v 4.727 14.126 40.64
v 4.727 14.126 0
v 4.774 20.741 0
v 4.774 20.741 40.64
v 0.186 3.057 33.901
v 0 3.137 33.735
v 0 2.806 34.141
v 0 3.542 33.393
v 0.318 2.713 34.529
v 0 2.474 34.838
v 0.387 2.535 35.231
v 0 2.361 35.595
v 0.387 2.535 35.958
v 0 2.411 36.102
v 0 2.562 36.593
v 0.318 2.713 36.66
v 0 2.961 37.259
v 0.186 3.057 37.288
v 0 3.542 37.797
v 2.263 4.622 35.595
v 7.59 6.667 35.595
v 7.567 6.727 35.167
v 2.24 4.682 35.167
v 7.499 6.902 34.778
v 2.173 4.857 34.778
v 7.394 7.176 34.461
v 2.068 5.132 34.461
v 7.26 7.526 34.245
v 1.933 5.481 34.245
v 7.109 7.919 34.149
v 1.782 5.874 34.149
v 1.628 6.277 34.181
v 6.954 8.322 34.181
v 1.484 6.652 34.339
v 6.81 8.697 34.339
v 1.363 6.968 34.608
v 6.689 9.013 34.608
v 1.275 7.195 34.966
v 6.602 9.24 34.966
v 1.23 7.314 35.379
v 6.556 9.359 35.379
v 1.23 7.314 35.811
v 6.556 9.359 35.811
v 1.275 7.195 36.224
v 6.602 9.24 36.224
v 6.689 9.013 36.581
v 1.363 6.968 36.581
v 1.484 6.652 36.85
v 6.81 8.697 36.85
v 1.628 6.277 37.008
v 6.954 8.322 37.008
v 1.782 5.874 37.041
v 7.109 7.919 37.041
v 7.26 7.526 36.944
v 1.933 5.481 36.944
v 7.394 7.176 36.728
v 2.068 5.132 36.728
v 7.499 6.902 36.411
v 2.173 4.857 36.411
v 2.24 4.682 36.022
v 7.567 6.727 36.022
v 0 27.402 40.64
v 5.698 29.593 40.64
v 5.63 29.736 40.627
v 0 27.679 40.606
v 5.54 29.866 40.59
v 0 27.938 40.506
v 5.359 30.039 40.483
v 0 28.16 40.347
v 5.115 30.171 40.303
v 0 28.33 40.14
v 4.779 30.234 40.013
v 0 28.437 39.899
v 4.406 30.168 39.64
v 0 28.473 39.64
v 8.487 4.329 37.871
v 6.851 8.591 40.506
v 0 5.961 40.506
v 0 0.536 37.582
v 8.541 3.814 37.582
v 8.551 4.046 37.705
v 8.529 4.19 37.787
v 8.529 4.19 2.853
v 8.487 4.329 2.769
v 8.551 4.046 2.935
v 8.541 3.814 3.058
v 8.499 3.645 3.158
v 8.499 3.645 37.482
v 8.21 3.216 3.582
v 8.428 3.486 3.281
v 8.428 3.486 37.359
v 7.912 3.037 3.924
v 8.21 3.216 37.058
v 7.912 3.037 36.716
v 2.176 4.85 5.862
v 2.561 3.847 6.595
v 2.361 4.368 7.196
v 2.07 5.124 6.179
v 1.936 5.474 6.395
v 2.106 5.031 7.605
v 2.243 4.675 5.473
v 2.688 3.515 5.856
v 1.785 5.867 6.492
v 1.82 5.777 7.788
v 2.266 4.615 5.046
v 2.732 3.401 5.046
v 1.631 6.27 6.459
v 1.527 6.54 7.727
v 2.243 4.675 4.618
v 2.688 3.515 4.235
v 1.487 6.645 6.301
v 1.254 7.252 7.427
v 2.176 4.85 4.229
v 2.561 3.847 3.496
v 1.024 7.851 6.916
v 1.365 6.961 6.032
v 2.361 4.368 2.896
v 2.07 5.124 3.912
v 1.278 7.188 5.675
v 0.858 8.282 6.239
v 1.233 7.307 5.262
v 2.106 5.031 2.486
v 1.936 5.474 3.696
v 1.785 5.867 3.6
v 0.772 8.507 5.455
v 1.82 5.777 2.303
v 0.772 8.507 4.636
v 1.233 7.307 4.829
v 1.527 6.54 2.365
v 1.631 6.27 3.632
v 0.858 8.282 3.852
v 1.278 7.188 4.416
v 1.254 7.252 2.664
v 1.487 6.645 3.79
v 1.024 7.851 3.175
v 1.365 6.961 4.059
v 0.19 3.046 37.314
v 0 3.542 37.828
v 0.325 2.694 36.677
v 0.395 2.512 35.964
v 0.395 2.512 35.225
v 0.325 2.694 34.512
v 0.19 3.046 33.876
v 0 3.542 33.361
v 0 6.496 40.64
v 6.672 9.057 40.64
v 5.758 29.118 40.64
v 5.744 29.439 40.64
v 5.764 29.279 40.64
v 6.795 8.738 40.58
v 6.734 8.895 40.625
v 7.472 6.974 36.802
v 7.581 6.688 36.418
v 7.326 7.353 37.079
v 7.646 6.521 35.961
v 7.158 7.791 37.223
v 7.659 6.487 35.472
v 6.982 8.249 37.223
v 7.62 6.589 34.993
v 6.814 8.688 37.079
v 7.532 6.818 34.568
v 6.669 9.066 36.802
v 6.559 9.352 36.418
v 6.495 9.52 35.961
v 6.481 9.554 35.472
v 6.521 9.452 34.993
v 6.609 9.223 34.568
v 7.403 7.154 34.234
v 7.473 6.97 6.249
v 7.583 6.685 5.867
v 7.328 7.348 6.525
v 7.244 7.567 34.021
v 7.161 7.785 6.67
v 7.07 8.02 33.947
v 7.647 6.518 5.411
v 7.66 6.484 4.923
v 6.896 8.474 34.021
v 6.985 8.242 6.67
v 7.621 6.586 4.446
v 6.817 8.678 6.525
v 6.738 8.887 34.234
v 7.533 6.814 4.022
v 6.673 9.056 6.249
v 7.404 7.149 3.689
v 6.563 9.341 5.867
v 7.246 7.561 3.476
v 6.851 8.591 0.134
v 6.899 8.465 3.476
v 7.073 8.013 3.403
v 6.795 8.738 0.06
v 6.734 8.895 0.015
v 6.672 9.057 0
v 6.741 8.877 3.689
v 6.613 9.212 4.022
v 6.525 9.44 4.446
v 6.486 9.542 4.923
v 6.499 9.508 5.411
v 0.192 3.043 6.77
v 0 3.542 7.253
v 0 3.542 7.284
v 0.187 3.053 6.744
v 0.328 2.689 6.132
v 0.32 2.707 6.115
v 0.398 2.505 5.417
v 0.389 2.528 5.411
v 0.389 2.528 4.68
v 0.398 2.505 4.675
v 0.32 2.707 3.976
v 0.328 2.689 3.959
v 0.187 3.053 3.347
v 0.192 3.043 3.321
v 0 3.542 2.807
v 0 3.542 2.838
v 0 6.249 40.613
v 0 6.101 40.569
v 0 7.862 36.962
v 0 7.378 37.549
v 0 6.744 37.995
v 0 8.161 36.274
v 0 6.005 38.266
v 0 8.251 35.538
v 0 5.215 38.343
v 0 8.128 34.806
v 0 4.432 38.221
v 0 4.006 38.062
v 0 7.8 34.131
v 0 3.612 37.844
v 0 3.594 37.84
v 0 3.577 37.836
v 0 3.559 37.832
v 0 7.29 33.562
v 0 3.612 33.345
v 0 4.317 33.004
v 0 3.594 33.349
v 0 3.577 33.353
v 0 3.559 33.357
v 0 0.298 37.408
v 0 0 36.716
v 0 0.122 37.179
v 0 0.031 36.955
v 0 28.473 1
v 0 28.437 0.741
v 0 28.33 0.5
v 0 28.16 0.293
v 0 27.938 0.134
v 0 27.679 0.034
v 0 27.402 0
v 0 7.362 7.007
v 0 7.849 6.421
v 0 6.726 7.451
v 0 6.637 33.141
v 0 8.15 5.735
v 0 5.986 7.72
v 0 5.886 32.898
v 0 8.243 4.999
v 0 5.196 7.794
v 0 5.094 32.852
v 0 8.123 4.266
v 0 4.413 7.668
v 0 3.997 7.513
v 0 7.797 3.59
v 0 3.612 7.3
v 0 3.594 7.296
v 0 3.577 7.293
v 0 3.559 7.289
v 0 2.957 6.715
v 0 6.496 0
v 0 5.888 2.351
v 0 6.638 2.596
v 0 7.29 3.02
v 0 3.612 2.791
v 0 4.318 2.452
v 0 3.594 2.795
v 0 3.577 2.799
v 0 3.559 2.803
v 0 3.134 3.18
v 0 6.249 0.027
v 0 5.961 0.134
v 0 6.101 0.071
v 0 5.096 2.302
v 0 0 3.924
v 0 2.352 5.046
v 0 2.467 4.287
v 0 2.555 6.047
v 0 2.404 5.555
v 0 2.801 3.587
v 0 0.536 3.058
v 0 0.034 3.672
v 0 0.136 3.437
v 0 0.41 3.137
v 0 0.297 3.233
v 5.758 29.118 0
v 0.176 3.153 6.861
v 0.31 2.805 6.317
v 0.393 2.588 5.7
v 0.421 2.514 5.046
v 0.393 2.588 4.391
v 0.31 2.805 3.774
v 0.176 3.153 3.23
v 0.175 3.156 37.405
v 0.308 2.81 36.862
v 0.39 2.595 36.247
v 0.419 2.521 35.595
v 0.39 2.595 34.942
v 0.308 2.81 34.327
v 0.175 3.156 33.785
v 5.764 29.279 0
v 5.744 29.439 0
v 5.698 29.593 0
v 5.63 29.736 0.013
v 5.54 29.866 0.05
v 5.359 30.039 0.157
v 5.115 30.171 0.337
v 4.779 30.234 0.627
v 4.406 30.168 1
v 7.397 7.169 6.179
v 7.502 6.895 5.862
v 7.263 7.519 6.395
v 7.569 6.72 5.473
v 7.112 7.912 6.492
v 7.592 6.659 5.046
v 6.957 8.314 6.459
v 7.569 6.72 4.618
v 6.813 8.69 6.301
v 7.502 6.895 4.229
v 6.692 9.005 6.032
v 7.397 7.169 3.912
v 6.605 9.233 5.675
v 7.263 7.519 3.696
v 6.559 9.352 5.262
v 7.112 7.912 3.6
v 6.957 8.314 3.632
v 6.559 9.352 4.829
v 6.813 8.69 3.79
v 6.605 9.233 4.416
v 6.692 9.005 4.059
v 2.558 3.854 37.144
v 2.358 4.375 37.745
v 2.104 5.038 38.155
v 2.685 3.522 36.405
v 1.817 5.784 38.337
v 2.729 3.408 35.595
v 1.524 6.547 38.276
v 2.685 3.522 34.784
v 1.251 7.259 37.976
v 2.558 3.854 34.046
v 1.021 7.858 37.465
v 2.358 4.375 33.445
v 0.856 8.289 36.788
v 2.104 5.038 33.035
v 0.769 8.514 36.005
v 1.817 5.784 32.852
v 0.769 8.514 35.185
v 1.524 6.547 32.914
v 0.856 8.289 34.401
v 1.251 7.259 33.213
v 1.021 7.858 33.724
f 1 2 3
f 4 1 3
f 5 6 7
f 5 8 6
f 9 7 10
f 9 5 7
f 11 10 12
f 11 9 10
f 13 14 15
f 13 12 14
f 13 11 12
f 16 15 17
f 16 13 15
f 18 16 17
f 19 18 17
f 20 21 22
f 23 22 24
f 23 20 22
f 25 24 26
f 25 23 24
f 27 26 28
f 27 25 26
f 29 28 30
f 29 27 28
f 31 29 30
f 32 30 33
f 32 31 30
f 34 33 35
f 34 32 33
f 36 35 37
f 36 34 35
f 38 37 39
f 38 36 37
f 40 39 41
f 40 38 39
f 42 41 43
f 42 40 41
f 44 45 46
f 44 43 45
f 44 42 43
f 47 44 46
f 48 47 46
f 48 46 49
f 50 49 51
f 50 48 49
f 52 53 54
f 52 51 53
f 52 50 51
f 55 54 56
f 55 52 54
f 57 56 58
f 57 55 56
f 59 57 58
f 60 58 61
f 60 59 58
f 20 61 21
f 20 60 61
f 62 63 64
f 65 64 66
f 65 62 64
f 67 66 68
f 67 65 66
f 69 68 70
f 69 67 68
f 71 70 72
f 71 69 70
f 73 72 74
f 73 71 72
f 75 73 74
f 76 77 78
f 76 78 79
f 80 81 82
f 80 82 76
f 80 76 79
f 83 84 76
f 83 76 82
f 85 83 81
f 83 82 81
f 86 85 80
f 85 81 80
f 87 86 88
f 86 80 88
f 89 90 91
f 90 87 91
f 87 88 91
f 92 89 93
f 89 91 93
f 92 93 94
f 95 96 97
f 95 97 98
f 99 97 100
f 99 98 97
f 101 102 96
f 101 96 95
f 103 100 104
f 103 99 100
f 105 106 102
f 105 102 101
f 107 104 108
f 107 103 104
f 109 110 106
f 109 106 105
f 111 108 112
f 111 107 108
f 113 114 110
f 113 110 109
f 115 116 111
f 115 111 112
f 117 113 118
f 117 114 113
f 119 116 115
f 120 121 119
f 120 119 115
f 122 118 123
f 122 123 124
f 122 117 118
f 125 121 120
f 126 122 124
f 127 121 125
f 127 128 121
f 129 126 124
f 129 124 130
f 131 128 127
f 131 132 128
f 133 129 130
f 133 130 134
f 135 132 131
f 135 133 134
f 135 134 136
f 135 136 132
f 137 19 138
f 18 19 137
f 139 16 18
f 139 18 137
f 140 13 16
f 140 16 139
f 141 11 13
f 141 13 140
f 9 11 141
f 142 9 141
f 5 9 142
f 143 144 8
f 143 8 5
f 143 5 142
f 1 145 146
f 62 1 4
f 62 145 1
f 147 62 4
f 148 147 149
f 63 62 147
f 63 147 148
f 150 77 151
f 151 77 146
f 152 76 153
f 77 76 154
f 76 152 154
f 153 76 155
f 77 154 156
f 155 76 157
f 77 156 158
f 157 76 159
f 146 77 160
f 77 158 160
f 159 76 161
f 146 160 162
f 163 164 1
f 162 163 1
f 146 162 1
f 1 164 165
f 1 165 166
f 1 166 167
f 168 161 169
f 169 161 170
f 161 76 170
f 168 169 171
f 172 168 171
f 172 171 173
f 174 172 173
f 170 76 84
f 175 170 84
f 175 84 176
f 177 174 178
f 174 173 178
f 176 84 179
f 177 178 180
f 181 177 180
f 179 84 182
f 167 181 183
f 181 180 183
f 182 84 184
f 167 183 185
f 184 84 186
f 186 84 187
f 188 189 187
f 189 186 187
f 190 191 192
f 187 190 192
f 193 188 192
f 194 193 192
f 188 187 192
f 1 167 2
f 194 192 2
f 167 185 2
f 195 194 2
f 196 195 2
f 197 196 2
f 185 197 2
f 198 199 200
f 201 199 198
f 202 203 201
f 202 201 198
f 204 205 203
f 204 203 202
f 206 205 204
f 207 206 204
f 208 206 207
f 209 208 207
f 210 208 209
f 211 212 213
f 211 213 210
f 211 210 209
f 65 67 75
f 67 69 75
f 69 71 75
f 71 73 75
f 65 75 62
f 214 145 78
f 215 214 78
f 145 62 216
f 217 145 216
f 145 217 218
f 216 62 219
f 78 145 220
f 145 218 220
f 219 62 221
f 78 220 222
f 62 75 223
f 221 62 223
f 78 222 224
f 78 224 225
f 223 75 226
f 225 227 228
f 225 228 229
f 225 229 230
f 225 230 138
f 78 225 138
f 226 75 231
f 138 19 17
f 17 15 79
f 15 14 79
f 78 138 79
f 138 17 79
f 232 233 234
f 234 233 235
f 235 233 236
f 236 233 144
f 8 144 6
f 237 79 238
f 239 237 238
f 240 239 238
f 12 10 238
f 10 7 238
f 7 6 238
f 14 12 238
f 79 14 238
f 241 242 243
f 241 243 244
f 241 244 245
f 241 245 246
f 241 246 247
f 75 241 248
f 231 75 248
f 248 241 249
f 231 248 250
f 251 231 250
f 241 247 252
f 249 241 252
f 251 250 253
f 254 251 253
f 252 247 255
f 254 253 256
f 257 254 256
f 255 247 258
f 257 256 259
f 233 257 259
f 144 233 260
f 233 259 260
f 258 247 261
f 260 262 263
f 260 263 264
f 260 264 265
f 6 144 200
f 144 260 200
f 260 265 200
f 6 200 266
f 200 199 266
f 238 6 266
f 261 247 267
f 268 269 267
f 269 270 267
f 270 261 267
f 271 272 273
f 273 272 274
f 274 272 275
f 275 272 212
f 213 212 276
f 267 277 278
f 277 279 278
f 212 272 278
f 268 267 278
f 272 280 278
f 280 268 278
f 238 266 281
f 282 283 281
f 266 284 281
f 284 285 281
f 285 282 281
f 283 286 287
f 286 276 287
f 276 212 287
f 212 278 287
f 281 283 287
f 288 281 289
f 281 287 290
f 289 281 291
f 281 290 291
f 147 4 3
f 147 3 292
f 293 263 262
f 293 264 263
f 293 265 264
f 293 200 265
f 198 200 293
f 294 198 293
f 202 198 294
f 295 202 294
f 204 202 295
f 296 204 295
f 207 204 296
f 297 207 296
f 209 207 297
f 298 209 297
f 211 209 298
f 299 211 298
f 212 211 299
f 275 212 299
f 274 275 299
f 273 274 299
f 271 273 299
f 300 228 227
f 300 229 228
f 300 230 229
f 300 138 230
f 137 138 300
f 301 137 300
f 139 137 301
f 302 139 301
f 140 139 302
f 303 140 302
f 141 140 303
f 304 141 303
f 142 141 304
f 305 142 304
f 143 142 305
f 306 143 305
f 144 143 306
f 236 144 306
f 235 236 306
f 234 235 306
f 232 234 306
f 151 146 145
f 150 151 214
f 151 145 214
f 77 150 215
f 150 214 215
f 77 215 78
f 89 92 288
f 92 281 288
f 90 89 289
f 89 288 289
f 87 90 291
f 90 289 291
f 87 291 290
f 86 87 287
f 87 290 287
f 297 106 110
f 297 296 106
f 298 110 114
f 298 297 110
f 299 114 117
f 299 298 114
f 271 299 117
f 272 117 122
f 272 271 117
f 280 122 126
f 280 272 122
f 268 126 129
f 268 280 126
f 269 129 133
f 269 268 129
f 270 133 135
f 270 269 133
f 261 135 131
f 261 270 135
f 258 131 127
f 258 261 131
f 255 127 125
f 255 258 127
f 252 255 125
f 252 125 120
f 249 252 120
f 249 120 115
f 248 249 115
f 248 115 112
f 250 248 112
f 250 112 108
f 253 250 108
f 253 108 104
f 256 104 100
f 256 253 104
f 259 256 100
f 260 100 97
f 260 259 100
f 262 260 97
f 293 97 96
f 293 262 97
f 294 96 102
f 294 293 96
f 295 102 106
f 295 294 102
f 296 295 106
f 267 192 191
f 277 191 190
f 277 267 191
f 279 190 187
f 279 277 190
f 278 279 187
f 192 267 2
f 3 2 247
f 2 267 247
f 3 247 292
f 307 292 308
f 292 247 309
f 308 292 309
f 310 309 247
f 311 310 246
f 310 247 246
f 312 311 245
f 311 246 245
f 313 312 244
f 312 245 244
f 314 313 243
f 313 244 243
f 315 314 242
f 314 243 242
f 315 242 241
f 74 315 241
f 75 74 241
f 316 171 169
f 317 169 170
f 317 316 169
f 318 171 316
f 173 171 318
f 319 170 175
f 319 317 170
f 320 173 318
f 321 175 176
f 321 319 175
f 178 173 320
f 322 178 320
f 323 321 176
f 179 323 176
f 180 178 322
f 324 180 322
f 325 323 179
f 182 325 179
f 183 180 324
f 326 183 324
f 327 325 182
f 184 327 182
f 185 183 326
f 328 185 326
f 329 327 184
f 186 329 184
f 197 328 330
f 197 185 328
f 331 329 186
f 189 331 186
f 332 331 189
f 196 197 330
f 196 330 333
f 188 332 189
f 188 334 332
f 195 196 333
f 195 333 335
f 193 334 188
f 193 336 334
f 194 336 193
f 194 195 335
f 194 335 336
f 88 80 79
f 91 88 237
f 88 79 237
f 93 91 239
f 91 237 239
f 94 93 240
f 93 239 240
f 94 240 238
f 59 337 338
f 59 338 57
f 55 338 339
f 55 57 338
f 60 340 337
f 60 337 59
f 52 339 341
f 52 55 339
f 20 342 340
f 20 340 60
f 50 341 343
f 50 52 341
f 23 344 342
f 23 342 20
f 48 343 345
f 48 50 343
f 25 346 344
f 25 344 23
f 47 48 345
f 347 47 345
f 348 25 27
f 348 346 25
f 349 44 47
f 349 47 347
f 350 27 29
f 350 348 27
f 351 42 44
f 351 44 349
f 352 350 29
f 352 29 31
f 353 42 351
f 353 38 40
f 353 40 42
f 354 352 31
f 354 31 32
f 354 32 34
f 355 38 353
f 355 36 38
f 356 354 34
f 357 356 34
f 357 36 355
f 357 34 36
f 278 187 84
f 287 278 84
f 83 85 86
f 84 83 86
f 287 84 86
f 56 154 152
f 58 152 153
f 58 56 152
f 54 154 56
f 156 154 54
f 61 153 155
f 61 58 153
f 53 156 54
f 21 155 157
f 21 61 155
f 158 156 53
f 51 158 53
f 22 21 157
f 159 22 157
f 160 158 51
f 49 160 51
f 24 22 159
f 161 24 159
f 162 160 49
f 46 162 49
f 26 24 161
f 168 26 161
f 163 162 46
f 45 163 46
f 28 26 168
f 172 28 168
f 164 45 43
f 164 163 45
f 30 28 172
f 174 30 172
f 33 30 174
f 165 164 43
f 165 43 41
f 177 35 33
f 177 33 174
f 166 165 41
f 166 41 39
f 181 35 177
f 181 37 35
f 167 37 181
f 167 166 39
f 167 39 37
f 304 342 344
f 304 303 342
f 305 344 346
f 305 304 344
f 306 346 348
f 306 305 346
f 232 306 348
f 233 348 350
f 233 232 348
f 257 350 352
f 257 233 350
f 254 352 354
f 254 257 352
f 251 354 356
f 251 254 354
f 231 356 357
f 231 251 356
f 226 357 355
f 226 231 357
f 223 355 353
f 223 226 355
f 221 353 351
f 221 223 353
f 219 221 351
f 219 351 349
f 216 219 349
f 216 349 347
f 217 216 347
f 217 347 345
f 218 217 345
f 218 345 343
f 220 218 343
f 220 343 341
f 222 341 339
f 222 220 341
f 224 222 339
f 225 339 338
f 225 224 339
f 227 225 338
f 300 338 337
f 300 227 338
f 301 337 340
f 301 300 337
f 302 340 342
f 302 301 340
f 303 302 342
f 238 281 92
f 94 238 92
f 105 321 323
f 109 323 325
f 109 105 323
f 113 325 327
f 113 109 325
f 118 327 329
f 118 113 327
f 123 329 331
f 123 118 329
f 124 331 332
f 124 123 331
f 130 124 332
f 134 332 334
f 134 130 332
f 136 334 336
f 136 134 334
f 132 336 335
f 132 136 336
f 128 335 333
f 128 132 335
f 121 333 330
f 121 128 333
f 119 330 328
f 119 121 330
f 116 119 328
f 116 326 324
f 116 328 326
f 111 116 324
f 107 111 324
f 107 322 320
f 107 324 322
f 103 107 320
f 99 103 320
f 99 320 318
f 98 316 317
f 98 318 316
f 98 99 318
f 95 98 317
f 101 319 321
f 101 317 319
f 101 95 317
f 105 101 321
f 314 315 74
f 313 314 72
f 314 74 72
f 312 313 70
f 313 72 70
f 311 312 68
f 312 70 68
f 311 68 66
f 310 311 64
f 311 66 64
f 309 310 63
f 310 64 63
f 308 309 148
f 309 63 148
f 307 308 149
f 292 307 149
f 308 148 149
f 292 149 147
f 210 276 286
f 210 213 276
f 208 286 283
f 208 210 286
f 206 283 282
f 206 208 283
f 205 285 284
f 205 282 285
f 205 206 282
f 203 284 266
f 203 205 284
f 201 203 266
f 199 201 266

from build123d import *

# Parameters (mm, degrees)
EXTRUDE_L_DEPTH        = 40.640000266
SKETCH_506_R           = 1.642286764
EXTRUDE_A_DEPTH        = 8.205424
SKETCH_6_R             = 1.647216999
EXTRUDE_B_DEPTH        = 8.205424
SKETCH_66_R            = 2.75
CUT_EXTRUDE_2755_DEPTH = 51.448100318
CUT_EXTRUDE_2790_REACH = 51.787
FILLET_3_R             = 1


with BuildPart() as part:
    # 主L型: read off the stored shape, not the designer's step
    # 主L型 outline → 主L型 (new body)
    with BuildSketch(Plane.XY):
        Polygon((0, 28.473390503), (0, 0), (8.845423506, 3.395440187), (4.726521328, 14.125546488), (4.773897119, 20.740741864), (5.951057155, 30.762189648), align=None)
    extrude(amount=EXTRUDE_L_DEPTH)

    # Sketch 506 → 螺丝台A (add)
    with BuildSketch(Plane(origin=(8.845423506, 3.395440187, 0), x_dir=(0, 0, -1), z_dir=(0.9335804184498224, 0.3583679705094393, 0))):
        with Locations((-5.045565417, 4.946234453)):
            Circle(SKETCH_506_R)
    extrude(amount=-EXTRUDE_A_DEPTH)

    # 螺丝穿出面<6> → 螺丝台B (add)
    with BuildSketch(Plane(origin=(8.845423506, 3.395440187, 0), x_dir=(0, 0, -1), z_dir=(0.9335804184498224, 0.3583679705094393, 0))):
        with Locations((-35.594637562, 4.953875303)):
            Circle(SKETCH_6_R)
    extrude(amount=-EXTRUDE_B_DEPTH)

    # 草图64 → 螺丝A M2.5 凹头盖螺钉的柱形沉头孔14 (revolve, cut)
    with BuildSketch(Plane(origin=(-0.587571577, 5.072586706, 5.045565417), x_dir=(0.3583679705094393, -0.9335804184498224, 0), z_dir=(0, 0, 1))):
        Polygon((0, 0), (0, 18.012790366), (1.45, 18.012790366), (1.45, 2.5), (2.75, 2.5), (2.75, 0.025), (2.775, 0), align=None)
    revolve(axis=Axis((-6.515807234, 2.796950093, 5.045565417), (0.9335804184498225, 0.3583679705094394, 0)), mode=Mode.SUBTRACT)

    # 草图65 → 螺丝B M2.5 凹头盖螺钉的柱形沉头孔15 (revolve, cut)
    with BuildSketch(Plane(origin=(-0.590309813, 5.079720054, 35.594637562), x_dir=(0.3583679705094393, -0.9335804184498224, 0), z_dir=(0, 0, 1))):
        Polygon((0, 0), (0, 18.012790366), (1.45, 18.012790366), (1.45, 2.5), (2.75, 2.5), (2.75, 0.025), (2.775, 0), align=None)
    revolve(axis=Axis((-6.51854547, 2.804083441, 35.594637562), (0.9335804184498225, 0.35836797050943936, 0)), mode=Mode.SUBTRACT)

    # 草图66 → Cut-Extrude 2755 (cut, through all)
    with BuildSketch(Plane(origin=(3.518951472, 1.350799002, 0), x_dir=(0, 0, 1), z_dir=(-0.9335804184498225, -0.3583679705094393, 0))):
        with Locations(Location((5.045565417, 4.946234453, 0), (0, 0, 270))):
            Circle(SKETCH_66_R)
        with Locations(Location((35.594637562, 4.953875303, 0), (0, 0, 270))):
            Circle(SKETCH_66_R)
    extrude(amount=CUT_EXTRUDE_2755_DEPTH, mode=Mode.SUBTRACT)

    # Cut-Extrude 2790: up to this plane
    cut_extrude_2790_end = Plane(origin=(0, 28.473390503, 72.648652673), z_dir=(1, 0, 0))
    # 螺丝穿出面<7> → Cut-Extrude 2790 (cut, up to the surface)
    with BuildSketch(Plane(origin=(8.845423506, 3.395440187, 0), x_dir=(0, 0, -1), z_dir=(0.9335804184498224, 0.3583679705094393, 0)), mode=Mode.PRIVATE) as cut_extrude_2790_sk1:
        Polygon((0, 5.796717469), (-3.346571729, 0), (0, 0), align=None)
    cut_extrude_2790_tool1 = split(extrude(cut_extrude_2790_sk1.sketch, amount=-CUT_EXTRUDE_2790_REACH, mode=Mode.PRIVATE), bisect_by=cut_extrude_2790_end, keep=Keep.BOTH, mode=Mode.PRIVATE)
    cut_extrude_2790 = cut_extrude_2790_tool1.solids().sort_by_distance((8.152971, 5.199341, 1.115524))[0]
    add(cut_extrude_2790, mode=Mode.SUBTRACT)

    # 镜向6: Cut-Extrude 2790 across plane
    add(cut_extrude_2790.mirror(Plane(origin=(0, 0, 20.320000133), x_dir=(1, 0, 0), z_dir=(0, 0, -1))), mode=Mode.SUBTRACT)

    # 圆角3
    fillet_3_edges = [part.edges().sort_by_distance(p)[0] for p in [
        (5.951057155, 30.762189648, 20.320000133),
        (2.975528577, 29.617790076, 0),
        (2.975528577, 29.617790076, 40.640000266),
        (4.422711753, 1.697720093, 3.346571729),
        (3.384032816, 7.508133528, 0),
        (8.845423506, 3.395440187, 20.320000133),
        (3.384032816, 7.508133528, 40.640000266),
        (4.422711753, 1.697720093, 37.293428537),
    ]]
    fillet(fillet_3_edges, radius=FILLET_3_R)


solid = part.part
